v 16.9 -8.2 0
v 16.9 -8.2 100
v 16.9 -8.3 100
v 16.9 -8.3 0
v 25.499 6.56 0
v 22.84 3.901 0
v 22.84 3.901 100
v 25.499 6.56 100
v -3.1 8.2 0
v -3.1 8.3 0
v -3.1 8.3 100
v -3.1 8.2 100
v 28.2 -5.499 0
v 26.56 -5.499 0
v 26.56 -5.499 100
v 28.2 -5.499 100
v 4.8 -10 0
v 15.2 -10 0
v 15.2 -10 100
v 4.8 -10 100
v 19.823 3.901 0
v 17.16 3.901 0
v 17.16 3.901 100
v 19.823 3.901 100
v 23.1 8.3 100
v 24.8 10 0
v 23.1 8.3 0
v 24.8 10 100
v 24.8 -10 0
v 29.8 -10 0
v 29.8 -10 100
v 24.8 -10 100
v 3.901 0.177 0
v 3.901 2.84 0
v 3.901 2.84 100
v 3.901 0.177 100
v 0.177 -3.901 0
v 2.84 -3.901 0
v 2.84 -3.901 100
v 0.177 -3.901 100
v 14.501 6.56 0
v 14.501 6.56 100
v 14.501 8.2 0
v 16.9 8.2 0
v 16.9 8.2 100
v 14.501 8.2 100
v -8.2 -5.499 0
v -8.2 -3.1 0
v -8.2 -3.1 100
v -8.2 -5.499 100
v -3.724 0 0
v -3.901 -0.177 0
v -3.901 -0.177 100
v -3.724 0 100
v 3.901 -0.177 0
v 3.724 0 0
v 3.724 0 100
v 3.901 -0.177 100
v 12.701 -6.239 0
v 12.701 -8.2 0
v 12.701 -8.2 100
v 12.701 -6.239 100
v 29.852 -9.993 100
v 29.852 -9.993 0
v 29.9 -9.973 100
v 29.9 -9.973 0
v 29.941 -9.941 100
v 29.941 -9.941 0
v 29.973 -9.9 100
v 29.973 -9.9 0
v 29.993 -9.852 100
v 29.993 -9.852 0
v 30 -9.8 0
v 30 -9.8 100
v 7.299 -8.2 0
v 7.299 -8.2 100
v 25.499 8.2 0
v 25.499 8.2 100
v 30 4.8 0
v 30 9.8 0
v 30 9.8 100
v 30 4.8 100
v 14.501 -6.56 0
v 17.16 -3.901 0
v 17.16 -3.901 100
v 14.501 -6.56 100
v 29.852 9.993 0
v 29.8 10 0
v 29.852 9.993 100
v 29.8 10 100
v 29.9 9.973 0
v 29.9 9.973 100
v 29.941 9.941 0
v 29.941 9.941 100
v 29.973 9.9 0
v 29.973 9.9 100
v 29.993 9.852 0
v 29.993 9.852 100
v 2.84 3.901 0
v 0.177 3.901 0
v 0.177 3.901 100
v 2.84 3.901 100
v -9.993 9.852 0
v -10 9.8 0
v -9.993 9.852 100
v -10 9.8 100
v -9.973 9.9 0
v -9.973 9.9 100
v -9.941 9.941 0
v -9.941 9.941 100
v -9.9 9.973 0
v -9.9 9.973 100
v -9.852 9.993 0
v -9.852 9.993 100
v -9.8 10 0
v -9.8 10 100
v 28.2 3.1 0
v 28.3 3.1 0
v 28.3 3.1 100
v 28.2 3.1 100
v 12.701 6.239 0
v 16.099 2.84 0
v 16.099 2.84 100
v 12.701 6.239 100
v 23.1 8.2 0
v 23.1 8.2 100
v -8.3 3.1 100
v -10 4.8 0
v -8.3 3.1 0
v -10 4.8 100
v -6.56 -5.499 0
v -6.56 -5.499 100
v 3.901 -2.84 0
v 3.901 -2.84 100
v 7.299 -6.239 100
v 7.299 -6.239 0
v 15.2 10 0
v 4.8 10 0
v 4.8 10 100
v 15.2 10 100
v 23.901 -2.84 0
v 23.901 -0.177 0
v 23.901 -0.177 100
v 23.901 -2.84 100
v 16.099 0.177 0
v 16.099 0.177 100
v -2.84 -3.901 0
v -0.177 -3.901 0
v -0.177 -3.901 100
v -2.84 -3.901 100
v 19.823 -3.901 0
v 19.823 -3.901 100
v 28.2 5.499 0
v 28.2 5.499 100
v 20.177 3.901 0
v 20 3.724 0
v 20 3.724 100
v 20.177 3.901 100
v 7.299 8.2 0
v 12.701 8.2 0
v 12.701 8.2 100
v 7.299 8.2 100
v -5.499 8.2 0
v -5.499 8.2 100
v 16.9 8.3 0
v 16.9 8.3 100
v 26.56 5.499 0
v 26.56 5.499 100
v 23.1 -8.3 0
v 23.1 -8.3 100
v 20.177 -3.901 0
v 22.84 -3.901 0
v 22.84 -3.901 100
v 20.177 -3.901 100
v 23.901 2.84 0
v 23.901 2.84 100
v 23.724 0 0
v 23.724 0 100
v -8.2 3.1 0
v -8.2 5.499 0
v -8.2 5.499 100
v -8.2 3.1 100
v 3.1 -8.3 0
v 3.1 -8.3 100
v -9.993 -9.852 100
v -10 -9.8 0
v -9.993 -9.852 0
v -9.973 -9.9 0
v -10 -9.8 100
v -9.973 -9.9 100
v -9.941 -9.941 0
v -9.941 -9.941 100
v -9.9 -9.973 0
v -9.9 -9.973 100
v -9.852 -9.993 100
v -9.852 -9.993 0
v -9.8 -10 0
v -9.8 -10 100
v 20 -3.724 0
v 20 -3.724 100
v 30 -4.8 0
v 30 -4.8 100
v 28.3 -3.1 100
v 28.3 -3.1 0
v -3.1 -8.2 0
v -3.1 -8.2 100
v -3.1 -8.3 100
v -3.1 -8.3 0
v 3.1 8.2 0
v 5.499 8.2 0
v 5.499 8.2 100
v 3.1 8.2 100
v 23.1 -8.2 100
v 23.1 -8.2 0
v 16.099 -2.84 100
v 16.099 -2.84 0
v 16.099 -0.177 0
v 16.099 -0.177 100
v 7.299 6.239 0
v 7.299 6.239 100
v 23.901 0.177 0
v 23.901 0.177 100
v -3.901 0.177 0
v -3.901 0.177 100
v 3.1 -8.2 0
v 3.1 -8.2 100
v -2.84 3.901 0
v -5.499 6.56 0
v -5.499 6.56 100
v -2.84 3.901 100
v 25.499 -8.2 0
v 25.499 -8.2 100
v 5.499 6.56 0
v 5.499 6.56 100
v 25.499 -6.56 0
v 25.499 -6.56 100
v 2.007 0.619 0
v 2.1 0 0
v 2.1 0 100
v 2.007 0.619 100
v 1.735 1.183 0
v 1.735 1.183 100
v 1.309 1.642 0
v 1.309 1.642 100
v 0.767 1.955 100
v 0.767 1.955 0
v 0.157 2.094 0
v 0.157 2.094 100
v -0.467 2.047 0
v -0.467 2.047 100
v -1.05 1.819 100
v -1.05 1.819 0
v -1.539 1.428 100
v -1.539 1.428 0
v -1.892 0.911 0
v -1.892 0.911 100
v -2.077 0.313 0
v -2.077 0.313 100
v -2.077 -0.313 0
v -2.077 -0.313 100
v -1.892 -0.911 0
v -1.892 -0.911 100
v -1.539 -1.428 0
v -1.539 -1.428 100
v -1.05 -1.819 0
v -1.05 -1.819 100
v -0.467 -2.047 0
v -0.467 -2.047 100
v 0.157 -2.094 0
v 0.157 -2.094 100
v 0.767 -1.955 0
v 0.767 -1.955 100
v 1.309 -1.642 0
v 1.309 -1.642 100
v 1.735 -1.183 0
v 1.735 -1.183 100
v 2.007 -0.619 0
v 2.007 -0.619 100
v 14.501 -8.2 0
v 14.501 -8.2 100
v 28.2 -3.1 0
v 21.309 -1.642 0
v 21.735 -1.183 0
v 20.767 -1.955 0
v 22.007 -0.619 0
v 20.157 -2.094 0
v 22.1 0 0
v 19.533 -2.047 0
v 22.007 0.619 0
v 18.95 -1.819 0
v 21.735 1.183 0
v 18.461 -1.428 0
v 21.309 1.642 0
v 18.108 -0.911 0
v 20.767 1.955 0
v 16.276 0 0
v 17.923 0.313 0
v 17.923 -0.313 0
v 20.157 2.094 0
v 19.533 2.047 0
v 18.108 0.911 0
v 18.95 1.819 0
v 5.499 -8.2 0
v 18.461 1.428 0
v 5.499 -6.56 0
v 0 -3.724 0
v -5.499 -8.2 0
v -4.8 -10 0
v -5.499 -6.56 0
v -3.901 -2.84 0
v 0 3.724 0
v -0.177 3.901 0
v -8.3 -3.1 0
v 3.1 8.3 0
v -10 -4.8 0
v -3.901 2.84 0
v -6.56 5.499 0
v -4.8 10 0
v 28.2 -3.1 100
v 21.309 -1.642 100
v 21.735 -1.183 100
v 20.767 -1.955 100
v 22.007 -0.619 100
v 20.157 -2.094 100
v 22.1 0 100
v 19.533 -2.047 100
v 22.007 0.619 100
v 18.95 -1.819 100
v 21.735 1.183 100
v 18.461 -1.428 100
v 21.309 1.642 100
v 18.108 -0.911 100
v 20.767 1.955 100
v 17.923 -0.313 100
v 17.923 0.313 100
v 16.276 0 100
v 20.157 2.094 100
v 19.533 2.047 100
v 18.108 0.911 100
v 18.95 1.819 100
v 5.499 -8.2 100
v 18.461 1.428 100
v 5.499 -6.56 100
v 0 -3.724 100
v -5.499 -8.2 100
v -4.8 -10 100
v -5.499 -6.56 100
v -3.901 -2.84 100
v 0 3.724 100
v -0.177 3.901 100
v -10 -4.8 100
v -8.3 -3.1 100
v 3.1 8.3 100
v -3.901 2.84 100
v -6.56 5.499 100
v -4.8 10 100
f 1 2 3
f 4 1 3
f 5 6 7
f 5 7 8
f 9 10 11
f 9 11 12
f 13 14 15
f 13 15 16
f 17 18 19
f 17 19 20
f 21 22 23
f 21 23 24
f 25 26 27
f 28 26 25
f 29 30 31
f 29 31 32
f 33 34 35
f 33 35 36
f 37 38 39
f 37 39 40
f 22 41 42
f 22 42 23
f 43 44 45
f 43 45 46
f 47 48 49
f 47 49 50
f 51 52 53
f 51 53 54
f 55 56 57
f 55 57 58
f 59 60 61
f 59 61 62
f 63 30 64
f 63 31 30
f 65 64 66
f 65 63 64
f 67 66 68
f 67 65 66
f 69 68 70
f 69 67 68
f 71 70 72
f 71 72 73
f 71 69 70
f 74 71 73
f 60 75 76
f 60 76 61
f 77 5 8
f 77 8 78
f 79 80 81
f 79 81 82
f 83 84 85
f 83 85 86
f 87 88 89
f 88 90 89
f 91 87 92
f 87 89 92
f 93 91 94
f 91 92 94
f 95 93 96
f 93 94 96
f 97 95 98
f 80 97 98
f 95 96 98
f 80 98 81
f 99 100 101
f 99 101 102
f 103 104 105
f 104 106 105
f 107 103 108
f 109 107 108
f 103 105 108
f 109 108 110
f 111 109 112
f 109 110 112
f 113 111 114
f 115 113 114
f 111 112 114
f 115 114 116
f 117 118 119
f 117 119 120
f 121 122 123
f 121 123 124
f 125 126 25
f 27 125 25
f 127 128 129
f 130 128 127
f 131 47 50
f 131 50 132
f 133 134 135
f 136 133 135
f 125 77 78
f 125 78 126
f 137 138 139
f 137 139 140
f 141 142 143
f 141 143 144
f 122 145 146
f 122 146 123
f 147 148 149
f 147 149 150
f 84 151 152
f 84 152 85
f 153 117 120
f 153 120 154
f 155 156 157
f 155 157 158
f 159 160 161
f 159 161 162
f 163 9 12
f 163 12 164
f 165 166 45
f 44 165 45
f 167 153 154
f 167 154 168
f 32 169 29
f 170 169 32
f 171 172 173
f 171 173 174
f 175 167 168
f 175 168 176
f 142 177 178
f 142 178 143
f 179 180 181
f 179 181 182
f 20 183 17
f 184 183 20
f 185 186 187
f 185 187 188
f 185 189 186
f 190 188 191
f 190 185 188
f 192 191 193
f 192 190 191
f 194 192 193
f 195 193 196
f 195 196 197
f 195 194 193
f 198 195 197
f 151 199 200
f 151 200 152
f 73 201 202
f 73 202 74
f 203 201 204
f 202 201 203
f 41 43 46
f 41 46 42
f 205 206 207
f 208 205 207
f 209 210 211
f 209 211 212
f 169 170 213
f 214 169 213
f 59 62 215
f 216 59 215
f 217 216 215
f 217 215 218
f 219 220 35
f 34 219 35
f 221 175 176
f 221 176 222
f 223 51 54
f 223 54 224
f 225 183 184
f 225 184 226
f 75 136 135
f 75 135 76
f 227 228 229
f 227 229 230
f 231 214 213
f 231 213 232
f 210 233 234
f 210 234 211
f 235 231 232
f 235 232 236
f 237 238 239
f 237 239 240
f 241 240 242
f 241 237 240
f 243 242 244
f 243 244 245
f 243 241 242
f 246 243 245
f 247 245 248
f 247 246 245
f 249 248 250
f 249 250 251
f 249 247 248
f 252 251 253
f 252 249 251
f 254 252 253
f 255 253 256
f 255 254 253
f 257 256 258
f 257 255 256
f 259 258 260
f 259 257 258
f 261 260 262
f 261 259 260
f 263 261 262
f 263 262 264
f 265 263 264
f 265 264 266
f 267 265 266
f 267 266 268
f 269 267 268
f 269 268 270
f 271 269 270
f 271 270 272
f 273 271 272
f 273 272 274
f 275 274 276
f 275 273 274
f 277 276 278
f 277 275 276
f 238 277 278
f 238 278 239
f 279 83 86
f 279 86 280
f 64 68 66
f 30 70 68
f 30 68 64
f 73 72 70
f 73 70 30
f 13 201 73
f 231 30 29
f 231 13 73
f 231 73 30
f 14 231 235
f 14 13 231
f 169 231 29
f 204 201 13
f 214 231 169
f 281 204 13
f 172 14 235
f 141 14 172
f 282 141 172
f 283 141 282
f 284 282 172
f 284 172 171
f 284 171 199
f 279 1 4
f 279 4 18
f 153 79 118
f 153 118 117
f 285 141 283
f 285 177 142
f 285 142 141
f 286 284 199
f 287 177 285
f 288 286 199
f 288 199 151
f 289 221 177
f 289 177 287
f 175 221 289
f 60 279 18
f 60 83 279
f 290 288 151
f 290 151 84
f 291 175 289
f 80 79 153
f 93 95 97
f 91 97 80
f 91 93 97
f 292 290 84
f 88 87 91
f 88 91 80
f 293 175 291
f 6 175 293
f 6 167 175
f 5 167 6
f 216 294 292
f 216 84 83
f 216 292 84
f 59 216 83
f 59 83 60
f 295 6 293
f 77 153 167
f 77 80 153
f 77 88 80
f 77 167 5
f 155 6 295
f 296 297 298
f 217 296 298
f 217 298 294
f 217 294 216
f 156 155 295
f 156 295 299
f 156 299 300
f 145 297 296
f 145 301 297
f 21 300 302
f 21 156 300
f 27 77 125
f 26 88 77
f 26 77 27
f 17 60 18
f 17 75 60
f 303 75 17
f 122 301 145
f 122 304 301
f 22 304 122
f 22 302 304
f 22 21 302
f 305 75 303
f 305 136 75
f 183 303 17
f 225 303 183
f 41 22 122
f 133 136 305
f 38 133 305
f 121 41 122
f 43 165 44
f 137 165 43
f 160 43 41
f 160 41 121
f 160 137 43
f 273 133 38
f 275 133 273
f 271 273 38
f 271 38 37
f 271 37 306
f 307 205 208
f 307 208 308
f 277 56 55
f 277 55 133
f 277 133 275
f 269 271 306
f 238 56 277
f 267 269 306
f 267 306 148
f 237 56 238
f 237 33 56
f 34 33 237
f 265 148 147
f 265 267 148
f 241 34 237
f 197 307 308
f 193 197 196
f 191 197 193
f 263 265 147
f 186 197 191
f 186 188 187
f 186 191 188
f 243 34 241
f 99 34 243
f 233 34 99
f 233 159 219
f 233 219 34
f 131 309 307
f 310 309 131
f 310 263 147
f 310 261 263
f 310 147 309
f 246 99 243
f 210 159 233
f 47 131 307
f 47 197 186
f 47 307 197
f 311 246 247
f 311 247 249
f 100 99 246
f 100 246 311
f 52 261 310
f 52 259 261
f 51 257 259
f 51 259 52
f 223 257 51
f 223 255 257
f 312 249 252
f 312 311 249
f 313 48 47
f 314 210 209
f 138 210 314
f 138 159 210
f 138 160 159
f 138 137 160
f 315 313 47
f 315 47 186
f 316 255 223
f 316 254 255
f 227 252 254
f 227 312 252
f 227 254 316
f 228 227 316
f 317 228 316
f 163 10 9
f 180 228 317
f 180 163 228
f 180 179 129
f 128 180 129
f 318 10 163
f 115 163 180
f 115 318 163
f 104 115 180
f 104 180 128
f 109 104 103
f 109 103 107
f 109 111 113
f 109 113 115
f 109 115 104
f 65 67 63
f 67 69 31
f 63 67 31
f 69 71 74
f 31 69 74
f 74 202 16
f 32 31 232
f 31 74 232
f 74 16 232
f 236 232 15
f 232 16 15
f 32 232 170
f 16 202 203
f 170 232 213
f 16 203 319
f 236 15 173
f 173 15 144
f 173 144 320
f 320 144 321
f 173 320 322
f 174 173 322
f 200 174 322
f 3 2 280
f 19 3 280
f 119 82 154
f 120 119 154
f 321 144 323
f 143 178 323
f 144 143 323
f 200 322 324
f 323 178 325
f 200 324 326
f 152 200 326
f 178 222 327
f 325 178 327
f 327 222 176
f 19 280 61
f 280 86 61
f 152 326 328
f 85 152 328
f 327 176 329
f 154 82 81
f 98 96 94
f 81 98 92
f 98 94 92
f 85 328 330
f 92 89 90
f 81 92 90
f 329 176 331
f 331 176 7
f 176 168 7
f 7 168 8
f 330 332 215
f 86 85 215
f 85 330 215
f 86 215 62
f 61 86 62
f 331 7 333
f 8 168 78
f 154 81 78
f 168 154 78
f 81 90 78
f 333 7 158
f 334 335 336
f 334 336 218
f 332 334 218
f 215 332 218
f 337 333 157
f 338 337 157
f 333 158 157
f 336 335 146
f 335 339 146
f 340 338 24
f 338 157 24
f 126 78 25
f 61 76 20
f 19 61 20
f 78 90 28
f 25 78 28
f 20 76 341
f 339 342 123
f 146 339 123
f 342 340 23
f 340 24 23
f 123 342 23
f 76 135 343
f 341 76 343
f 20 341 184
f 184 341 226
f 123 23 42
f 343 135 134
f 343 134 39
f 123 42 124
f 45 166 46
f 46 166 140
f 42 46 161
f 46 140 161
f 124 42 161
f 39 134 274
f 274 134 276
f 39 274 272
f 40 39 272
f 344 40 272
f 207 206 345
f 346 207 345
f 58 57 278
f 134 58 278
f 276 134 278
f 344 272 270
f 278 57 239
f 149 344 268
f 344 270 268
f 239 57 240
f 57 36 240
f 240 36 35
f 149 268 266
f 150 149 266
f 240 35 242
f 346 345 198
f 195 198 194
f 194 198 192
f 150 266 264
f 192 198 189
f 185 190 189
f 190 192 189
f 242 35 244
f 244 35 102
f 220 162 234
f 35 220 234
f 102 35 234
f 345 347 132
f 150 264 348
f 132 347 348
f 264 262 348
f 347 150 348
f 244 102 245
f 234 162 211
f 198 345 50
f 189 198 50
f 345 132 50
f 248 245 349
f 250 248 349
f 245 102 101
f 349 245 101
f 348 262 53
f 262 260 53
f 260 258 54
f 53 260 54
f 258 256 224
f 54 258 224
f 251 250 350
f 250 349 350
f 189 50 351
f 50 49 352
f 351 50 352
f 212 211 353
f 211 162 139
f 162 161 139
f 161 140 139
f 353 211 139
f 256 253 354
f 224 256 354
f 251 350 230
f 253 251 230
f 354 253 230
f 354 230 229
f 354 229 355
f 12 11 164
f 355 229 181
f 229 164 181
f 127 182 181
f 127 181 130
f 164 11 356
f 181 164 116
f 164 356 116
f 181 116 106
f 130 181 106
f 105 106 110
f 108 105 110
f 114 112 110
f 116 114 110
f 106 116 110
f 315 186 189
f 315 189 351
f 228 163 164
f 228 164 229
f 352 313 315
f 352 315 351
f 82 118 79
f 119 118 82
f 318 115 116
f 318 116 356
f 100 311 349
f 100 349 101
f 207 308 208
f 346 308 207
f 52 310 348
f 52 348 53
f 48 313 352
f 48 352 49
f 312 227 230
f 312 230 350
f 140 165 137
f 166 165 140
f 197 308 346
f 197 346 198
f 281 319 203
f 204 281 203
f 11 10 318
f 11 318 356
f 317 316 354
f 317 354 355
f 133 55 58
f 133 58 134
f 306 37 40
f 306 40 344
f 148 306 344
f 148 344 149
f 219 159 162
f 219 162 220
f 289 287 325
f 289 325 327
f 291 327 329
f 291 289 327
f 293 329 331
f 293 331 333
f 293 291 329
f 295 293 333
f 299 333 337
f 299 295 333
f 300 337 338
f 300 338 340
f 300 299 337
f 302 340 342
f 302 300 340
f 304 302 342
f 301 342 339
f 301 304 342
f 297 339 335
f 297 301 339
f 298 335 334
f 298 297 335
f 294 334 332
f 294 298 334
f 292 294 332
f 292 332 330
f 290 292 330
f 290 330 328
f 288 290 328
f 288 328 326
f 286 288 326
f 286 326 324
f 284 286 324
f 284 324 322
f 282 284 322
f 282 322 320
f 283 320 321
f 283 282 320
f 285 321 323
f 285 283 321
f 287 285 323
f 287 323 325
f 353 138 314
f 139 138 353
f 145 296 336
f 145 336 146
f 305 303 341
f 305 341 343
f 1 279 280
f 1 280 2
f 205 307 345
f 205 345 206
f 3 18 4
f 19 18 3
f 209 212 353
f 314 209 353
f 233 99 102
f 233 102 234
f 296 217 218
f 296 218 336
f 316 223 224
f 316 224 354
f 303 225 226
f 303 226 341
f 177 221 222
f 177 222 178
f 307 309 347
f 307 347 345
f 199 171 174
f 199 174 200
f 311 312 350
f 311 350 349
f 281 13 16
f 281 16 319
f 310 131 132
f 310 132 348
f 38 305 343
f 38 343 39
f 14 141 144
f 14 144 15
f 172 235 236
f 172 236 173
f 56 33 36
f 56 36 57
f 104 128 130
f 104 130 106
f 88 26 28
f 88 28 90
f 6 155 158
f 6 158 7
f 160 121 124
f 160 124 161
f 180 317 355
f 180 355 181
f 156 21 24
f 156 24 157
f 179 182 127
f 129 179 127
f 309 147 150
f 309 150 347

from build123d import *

# Parameters (mm, degrees)
SKETCH_R         = 2.1
PAD_DEPTH        = 100
CHAMFER_1_ANGLE  = 45
CHAMFER_1_SIZE   = 1.7
CHAMFER_2_ANGLE  = 45
CHAMFER_2_SIZE   = 1.7
CHAMFER_3_ANGLE  = 45
CHAMFER_3_SIZE   = 1.7
CHAMFER_4_ANGLE  = 45
CHAMFER_4_SIZE   = 1.7
CHAMFER_5_ANGLE  = 45
CHAMFER_5_SIZE   = 1.7
CHAMFER_6_ANGLE  = 45
CHAMFER_6_SIZE   = 1.7
CHAMFER_7_ANGLE  = 45
CHAMFER_7_SIZE   = 1.7
CHAMFER_8_ANGLE  = 45
CHAMFER_8_SIZE   = 1.7
CHAMFER_9_ANGLE  = 45
CHAMFER_9_SIZE   = 1.7
CHAMFER_10_ANGLE = 45
CHAMFER_10_SIZE  = 1.7
CHAMFER_11_ANGLE = 45
CHAMFER_11_SIZE  = 1.7
CHAMFER_12_ANGLE = 45
CHAMFER_12_SIZE  = 1.7
FILLET_R         = 0.2


with BuildPart() as part:
    # Sketch → Pad (new body)
    with BuildSketch(Plane.XY):
        Polygon((0, 3.723883), (0.176777, 3.90066), (2.84, 3.90066), (5.49934, 6.56), (5.49934, 8.2), (3.1, 8.2), (3.1, 10), (16.9, 10), (16.9, 8.2), (14.50066, 8.2), (14.50066, 6.56), (17.16, 3.90066), (19.823223, 3.90066), (20, 3.723883), (20.176777, 3.90066), (22.84, 3.90066), (25.49934, 6.56), (25.49934, 8.2), (23.1, 8.2), (23.1, 10), (30, 10), (30, 3.1), (28.2, 3.1), (28.2, 5.49934), (26.56, 5.49934), (23.90066, 2.84), (23.90066, 0.176777), (23.723883, 0), (23.90066, -0.176777), (23.90066, -2.84), (26.56, -5.49934), (28.2, -5.49934), (28.2, -3.1), (30, -3.1), (30, -10), (23.1, -10), (23.1, -8.2), (25.49934, -8.2), (25.49934, -6.56), (22.84, -3.90066), (20.176777, -3.90066), (20, -3.723883), (19.823223, -3.90066), (17.16, -3.90066), (14.50066, -6.56), (14.50066, -8.2), (16.9, -8.2), (16.9, -10), (3.1, -10), (3.1, -8.2), (5.49934, -8.2), (5.49934, -6.56), (2.84, -3.90066), (0.176777, -3.90066), (0, -3.723883), (-0.176777, -3.90066), (-2.84, -3.90066), (-5.49934, -6.56), (-5.49934, -8.2), (-3.1, -8.2), (-3.1, -10), (-10, -10), (-10, -3.1), (-8.2, -3.1), (-8.2, -5.49934), (-6.56, -5.49934), (-3.90066, -2.84), (-3.90066, -0.176777), (-3.723883, 0), (-3.90066, 0.176777), (-3.90066, 2.84), (-6.56, 5.49934), (-8.2, 5.49934), (-8.2, 3.1), (-10, 3.1), (-10, 10), (-3.1, 10), (-3.1, 8.2), (-5.49934, 8.2), (-5.49934, 6.56), (-2.84, 3.90066), (-0.176777, 3.90066), align=None)
        Circle(SKETCH_R, mode=Mode.SUBTRACT)
        with Locations((20, 0)):
            Circle(SKETCH_R, mode=Mode.SUBTRACT)
        Polygon((7.29934, 6.23868), (3.90066, 2.84), (3.90066, 0.176777), (3.723883, 0), (3.90066, -0.176777), (3.90066, -2.84), (7.29934, -6.23868), (7.29934, -8.2), (12.70066, -8.2), (12.70066, -6.23868), (16.09934, -2.84), (16.09934, -0.176777), (16.276117, 0), (16.09934, 0.176777), (16.09934, 2.84), (12.70066, 6.23868), (12.70066, 8.2), (7.29934, 8.2), align=None, mode=Mode.SUBTRACT)
    extrude(amount=PAD_DEPTH)

    # Chamfer 1
    chamfer_1_edges = [part.edges().sort_by_distance(p)[0] for p in [
        (3.1, -10, 50),
    ]]
    chamfer_1_side = part.faces().sort_by_distance((10, -10, 50))[0]
    chamfer(chamfer_1_edges, length=CHAMFER_1_SIZE, angle=CHAMFER_1_ANGLE, reference=chamfer_1_side)

    # Chamfer 2
    chamfer_2_edges = [part.edges().sort_by_distance(p)[0] for p in [
        (16.9, -10, 50),
    ]]
    chamfer_2_side = part.faces().sort_by_distance((16.9, -9.1, 50))[0]
    chamfer(chamfer_2_edges, length=CHAMFER_2_SIZE, angle=CHAMFER_2_ANGLE, reference=chamfer_2_side)

    # Chamfer 3
    chamfer_3_edges = [part.edges().sort_by_distance(p)[0] for p in [
        (23.1, -10, 50),
    ]]
    chamfer_3_side = part.faces().sort_by_distance((26.55, -10, 50))[0]
    chamfer(chamfer_3_edges, length=CHAMFER_3_SIZE, angle=CHAMFER_3_ANGLE, reference=chamfer_3_side)

    # Chamfer 4
    chamfer_4_edges = [part.edges().sort_by_distance(p)[0] for p in [
        (-3.1, -10, 50),
    ]]
    chamfer_4_side = part.faces().sort_by_distance((-3.1, -9.1, 50))[0]
    chamfer(chamfer_4_edges, length=CHAMFER_4_SIZE, angle=CHAMFER_4_ANGLE, reference=chamfer_4_side)

    # Chamfer 5
    chamfer_5_edges = [part.edges().sort_by_distance(p)[0] for p in [
        (30, -3.1, 50),
    ]]
    chamfer_5_side = part.faces().sort_by_distance((29.1, -3.1, 50))[0]
    chamfer(chamfer_5_edges, length=CHAMFER_5_SIZE, angle=CHAMFER_5_ANGLE, reference=chamfer_5_side)

    # Chamfer 6
    chamfer_6_edges = [part.edges().sort_by_distance(p)[0] for p in [
        (30, 3.1, 50),
    ]]
    chamfer_6_side = part.faces().sort_by_distance((30, 6.55, 50))[0]
    chamfer(chamfer_6_edges, length=CHAMFER_6_SIZE, angle=CHAMFER_6_ANGLE, reference=chamfer_6_side)

    # Chamfer 7
    chamfer_7_edges = [part.edges().sort_by_distance(p)[0] for p in [
        (23.1, 10, 50),
    ]]
    chamfer_7_side = part.faces().sort_by_distance((23.1, 9.1, 50))[0]
    chamfer(chamfer_7_edges, length=CHAMFER_7_SIZE, angle=CHAMFER_7_ANGLE, reference=chamfer_7_side)

    # Chamfer 8
    chamfer_8_edges = [part.edges().sort_by_distance(p)[0] for p in [
        (16.9, 10, 50),
    ]]
    chamfer_8_side = part.faces().sort_by_distance((10, 10, 50))[0]
    chamfer(chamfer_8_edges, length=CHAMFER_8_SIZE, angle=CHAMFER_8_ANGLE, reference=chamfer_8_side)

    # Chamfer 9
    chamfer_9_edges = [part.edges().sort_by_distance(p)[0] for p in [
        (3.1, 10, 50),
    ]]
    chamfer_9_side = part.faces().sort_by_distance((3.1, 9.1, 50))[0]
    chamfer(chamfer_9_edges, length=CHAMFER_9_SIZE, angle=CHAMFER_9_ANGLE, reference=chamfer_9_side)

    # Chamfer 10
    chamfer_10_edges = [part.edges().sort_by_distance(p)[0] for p in [
        (-3.1, 10, 50),
    ]]
    chamfer_10_side = part.faces().sort_by_distance((-6.55, 10, 50))[0]
    chamfer(chamfer_10_edges, length=CHAMFER_10_SIZE, angle=CHAMFER_10_ANGLE, reference=chamfer_10_side)

    # Chamfer 11
    chamfer_11_edges = [part.edges().sort_by_distance(p)[0] for p in [
        (-10, -3.1, 50),
    ]]
    chamfer_11_side = part.faces().sort_by_distance((-10, -6.55, 50))[0]
    chamfer(chamfer_11_edges, length=CHAMFER_11_SIZE, angle=CHAMFER_11_ANGLE, reference=chamfer_11_side)

    # Chamfer 12
    chamfer_12_edges = [part.edges().sort_by_distance(p)[0] for p in [
        (-10, 3.1, 50),
    ]]
    chamfer_12_side = part.faces().sort_by_distance((-9.1, 3.1, 50))[0]
    chamfer(chamfer_12_edges, length=CHAMFER_12_SIZE, angle=CHAMFER_12_ANGLE, reference=chamfer_12_side)

    # Fillet
    fillet_edges = [part.edges().sort_by_distance(p)[0] for p in [
        (-10, -10, 50),
        (-10, 10, 50),
        (30, 10, 50),
        (30, -10, 50),
    ]]
    fillet(fillet_edges, radius=FILLET_R)


solid = part.part
